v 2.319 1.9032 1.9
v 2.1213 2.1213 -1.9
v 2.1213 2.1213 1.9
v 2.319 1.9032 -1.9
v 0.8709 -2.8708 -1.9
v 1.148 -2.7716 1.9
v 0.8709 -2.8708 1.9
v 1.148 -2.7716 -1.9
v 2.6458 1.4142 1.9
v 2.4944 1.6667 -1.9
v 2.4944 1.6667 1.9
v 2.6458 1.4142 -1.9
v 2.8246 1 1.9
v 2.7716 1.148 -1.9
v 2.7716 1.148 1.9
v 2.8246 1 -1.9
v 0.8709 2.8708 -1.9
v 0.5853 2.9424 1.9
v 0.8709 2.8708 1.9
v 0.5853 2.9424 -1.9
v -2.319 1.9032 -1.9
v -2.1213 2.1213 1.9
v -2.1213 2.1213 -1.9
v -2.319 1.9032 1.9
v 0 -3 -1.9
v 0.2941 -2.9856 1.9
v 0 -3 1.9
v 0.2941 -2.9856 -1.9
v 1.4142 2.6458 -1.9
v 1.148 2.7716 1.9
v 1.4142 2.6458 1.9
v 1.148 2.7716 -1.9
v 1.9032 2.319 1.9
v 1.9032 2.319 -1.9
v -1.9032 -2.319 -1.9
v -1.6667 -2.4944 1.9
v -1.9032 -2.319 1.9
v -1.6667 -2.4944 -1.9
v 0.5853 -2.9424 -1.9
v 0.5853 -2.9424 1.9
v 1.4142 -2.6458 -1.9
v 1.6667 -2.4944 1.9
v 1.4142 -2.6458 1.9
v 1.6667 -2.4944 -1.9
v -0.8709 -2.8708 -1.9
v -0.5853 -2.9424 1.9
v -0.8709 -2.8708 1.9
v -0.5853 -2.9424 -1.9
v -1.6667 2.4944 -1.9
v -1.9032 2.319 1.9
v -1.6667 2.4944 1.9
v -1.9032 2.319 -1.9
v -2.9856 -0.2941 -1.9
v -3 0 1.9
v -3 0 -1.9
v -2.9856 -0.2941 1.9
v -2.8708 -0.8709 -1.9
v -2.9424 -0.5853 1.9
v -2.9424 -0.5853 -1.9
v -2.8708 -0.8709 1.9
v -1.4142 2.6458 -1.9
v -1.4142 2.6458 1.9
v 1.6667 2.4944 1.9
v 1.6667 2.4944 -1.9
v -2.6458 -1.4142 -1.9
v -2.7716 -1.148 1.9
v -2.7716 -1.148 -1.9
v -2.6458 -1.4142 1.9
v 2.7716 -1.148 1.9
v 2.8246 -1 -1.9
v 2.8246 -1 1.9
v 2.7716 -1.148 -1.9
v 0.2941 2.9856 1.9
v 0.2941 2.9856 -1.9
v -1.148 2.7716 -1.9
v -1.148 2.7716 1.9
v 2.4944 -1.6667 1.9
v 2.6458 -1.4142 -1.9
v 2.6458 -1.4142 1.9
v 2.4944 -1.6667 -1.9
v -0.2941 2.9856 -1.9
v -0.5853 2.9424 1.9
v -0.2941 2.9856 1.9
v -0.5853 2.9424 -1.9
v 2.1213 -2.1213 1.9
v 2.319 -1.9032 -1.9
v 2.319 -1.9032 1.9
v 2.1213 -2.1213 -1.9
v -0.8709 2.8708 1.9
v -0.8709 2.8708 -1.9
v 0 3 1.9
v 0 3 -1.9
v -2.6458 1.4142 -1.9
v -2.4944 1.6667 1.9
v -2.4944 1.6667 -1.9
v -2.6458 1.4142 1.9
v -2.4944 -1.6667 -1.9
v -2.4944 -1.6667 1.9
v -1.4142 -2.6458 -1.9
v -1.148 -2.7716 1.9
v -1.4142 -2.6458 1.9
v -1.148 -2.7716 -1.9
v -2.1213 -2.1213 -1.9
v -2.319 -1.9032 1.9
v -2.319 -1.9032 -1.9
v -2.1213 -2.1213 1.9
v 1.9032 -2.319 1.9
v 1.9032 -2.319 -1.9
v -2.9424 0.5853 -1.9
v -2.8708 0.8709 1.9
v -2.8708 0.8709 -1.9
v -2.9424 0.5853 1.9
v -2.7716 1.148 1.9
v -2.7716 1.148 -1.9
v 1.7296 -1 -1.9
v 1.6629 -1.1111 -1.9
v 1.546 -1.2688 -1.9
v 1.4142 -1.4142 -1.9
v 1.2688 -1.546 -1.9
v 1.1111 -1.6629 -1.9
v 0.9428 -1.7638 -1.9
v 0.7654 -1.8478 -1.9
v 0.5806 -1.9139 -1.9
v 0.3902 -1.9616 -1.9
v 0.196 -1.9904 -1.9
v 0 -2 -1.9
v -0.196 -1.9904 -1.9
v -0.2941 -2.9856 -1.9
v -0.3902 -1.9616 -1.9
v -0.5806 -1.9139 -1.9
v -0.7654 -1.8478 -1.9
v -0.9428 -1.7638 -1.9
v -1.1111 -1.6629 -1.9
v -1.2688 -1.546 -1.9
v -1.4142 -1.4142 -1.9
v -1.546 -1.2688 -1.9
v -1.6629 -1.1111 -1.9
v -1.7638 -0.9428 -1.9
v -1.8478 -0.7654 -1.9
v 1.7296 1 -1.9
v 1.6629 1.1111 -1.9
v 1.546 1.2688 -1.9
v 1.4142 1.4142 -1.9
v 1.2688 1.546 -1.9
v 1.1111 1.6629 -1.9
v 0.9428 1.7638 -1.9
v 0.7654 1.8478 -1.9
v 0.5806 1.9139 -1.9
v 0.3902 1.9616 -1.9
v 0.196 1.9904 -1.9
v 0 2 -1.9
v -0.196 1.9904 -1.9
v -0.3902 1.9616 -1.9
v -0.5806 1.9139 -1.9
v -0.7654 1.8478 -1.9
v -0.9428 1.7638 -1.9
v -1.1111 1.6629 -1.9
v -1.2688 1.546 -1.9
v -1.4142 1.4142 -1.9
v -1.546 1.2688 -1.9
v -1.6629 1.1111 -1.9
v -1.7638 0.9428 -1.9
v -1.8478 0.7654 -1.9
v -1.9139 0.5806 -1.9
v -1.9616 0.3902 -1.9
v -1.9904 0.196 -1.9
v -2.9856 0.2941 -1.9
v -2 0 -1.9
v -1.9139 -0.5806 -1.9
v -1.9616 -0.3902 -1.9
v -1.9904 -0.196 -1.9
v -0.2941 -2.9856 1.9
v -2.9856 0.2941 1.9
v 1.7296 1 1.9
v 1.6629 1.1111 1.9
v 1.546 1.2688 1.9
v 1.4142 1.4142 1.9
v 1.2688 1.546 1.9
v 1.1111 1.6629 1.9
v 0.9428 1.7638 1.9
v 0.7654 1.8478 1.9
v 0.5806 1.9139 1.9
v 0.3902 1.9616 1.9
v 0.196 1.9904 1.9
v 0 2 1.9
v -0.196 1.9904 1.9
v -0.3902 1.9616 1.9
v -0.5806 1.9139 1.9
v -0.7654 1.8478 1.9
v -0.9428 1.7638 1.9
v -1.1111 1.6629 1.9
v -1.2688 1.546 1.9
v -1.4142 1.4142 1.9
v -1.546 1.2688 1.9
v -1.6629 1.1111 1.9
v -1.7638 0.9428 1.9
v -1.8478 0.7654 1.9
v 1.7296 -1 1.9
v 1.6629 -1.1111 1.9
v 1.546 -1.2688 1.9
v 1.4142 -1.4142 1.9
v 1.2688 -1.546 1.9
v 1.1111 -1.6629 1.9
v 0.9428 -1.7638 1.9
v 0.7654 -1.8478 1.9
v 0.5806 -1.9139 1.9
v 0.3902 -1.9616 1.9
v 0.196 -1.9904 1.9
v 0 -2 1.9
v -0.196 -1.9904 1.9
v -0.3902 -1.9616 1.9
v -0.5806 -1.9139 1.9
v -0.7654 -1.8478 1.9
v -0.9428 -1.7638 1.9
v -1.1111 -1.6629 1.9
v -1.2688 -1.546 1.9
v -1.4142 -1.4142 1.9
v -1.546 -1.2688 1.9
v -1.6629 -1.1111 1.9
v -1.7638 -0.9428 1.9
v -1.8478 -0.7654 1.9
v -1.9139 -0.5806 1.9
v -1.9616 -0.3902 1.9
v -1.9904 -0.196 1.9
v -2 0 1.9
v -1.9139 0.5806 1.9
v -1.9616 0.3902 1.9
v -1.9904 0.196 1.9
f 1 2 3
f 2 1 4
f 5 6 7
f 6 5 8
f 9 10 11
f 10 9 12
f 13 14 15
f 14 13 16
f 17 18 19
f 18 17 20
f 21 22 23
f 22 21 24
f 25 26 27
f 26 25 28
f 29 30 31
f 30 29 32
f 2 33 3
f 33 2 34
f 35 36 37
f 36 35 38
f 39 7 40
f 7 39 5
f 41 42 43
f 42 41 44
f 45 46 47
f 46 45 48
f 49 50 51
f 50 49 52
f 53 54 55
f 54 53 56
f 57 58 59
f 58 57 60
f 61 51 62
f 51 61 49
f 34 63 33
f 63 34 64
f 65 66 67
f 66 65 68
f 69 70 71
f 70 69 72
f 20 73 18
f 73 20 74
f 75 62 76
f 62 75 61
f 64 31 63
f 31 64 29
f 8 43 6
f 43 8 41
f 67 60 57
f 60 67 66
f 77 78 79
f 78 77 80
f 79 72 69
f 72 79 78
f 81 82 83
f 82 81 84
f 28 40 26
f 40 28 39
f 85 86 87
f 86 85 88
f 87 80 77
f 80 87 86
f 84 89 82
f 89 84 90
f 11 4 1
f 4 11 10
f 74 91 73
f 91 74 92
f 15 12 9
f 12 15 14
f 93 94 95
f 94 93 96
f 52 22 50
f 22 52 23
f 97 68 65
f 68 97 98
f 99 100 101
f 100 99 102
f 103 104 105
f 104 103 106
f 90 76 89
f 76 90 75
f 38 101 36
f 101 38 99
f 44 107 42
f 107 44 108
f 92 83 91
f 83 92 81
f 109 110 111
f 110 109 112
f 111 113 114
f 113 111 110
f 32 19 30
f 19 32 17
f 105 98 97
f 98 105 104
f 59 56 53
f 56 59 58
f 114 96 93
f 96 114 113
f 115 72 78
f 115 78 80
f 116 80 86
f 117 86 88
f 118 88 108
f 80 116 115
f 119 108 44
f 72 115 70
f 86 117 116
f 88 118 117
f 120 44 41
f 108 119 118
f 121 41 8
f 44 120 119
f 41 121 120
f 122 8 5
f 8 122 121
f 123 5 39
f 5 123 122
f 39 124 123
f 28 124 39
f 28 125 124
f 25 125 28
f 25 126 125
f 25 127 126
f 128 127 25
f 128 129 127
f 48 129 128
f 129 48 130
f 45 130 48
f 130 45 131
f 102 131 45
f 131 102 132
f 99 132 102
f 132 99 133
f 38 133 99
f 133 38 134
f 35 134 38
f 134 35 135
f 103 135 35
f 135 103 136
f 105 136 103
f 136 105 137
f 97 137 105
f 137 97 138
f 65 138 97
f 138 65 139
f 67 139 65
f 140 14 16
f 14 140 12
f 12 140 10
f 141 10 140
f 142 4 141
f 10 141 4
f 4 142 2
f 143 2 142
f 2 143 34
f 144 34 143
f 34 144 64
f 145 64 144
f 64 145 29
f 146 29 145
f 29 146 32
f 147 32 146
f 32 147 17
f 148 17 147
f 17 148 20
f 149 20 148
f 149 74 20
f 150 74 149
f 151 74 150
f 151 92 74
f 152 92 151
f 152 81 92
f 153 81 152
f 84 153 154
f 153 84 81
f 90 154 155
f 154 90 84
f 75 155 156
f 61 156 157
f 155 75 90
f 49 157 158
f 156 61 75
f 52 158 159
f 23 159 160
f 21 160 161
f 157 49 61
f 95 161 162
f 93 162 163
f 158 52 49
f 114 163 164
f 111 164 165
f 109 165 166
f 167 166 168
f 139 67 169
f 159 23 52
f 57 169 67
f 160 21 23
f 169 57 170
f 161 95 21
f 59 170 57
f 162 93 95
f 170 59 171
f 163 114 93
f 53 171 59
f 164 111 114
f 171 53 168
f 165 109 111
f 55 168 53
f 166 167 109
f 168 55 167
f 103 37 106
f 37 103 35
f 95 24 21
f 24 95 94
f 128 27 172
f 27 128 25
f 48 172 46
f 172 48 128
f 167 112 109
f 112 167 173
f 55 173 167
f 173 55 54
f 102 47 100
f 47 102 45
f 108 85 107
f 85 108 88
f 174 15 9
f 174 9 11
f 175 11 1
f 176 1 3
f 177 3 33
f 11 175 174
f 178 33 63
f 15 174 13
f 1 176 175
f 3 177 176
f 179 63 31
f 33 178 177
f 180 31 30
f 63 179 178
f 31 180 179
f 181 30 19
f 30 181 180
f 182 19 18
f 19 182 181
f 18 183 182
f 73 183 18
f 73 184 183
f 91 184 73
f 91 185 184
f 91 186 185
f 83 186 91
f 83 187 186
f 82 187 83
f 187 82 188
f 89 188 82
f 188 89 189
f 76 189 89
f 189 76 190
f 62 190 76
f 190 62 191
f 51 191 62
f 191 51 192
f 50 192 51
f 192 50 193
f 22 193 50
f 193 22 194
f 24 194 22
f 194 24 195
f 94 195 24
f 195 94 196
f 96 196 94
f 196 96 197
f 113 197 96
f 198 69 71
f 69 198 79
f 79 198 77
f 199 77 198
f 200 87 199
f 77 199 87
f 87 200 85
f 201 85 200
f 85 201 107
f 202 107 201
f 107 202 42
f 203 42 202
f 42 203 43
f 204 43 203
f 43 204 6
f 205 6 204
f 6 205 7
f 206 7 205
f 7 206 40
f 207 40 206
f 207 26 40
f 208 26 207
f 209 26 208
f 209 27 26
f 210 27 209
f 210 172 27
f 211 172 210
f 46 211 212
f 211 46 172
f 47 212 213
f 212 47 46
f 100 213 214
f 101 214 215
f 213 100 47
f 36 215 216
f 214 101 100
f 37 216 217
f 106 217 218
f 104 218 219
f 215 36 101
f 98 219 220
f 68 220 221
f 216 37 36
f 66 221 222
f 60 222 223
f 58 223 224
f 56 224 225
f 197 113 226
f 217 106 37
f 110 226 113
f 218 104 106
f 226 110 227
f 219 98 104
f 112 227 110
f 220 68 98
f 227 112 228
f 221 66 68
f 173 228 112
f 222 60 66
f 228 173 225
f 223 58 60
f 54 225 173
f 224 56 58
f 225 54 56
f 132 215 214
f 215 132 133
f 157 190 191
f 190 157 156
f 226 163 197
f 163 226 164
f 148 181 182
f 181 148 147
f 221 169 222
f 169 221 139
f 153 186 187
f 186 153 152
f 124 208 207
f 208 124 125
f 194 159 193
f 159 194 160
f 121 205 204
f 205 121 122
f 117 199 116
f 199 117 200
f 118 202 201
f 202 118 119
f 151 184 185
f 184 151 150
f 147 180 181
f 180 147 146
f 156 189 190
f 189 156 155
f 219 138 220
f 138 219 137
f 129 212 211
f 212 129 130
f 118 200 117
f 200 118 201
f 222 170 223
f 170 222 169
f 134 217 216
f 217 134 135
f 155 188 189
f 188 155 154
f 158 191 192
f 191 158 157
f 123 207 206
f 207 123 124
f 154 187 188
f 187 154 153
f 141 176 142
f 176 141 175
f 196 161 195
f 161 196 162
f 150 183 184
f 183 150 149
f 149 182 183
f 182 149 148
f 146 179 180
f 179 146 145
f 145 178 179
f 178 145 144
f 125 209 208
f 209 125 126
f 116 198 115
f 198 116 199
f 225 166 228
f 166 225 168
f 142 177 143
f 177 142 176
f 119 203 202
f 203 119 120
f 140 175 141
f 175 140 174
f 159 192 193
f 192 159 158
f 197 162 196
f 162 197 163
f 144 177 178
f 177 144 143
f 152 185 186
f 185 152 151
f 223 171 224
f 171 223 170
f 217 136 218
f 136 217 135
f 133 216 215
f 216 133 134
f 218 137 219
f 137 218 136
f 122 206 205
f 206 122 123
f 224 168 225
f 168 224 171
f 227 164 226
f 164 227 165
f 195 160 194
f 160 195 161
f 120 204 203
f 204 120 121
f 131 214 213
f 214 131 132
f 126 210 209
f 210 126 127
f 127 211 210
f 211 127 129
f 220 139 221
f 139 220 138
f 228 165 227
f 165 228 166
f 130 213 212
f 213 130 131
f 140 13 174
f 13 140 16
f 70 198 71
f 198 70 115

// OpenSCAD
// A substitute for nylon rings for Low-Pro Edge style tremolo arms


$fn = 64;
innerDiameter = 4;
outerDiameter = 6;
height = 3.8; // make it a bit lower to fit easily
cutout = 2;

difference () {
    difference () {
        cylinder(h = height, r1 = outerDiameter / 2, r2 = outerDiameter / 2, center = true);
        cylinder(h = height *2, r1 = innerDiameter / 2, r2 = innerDiameter / 2, center = true);
    }
    translate ([outerDiameter / 2,0,0])
    cube([outerDiameter, cutout, height * 2], center=true);
}
